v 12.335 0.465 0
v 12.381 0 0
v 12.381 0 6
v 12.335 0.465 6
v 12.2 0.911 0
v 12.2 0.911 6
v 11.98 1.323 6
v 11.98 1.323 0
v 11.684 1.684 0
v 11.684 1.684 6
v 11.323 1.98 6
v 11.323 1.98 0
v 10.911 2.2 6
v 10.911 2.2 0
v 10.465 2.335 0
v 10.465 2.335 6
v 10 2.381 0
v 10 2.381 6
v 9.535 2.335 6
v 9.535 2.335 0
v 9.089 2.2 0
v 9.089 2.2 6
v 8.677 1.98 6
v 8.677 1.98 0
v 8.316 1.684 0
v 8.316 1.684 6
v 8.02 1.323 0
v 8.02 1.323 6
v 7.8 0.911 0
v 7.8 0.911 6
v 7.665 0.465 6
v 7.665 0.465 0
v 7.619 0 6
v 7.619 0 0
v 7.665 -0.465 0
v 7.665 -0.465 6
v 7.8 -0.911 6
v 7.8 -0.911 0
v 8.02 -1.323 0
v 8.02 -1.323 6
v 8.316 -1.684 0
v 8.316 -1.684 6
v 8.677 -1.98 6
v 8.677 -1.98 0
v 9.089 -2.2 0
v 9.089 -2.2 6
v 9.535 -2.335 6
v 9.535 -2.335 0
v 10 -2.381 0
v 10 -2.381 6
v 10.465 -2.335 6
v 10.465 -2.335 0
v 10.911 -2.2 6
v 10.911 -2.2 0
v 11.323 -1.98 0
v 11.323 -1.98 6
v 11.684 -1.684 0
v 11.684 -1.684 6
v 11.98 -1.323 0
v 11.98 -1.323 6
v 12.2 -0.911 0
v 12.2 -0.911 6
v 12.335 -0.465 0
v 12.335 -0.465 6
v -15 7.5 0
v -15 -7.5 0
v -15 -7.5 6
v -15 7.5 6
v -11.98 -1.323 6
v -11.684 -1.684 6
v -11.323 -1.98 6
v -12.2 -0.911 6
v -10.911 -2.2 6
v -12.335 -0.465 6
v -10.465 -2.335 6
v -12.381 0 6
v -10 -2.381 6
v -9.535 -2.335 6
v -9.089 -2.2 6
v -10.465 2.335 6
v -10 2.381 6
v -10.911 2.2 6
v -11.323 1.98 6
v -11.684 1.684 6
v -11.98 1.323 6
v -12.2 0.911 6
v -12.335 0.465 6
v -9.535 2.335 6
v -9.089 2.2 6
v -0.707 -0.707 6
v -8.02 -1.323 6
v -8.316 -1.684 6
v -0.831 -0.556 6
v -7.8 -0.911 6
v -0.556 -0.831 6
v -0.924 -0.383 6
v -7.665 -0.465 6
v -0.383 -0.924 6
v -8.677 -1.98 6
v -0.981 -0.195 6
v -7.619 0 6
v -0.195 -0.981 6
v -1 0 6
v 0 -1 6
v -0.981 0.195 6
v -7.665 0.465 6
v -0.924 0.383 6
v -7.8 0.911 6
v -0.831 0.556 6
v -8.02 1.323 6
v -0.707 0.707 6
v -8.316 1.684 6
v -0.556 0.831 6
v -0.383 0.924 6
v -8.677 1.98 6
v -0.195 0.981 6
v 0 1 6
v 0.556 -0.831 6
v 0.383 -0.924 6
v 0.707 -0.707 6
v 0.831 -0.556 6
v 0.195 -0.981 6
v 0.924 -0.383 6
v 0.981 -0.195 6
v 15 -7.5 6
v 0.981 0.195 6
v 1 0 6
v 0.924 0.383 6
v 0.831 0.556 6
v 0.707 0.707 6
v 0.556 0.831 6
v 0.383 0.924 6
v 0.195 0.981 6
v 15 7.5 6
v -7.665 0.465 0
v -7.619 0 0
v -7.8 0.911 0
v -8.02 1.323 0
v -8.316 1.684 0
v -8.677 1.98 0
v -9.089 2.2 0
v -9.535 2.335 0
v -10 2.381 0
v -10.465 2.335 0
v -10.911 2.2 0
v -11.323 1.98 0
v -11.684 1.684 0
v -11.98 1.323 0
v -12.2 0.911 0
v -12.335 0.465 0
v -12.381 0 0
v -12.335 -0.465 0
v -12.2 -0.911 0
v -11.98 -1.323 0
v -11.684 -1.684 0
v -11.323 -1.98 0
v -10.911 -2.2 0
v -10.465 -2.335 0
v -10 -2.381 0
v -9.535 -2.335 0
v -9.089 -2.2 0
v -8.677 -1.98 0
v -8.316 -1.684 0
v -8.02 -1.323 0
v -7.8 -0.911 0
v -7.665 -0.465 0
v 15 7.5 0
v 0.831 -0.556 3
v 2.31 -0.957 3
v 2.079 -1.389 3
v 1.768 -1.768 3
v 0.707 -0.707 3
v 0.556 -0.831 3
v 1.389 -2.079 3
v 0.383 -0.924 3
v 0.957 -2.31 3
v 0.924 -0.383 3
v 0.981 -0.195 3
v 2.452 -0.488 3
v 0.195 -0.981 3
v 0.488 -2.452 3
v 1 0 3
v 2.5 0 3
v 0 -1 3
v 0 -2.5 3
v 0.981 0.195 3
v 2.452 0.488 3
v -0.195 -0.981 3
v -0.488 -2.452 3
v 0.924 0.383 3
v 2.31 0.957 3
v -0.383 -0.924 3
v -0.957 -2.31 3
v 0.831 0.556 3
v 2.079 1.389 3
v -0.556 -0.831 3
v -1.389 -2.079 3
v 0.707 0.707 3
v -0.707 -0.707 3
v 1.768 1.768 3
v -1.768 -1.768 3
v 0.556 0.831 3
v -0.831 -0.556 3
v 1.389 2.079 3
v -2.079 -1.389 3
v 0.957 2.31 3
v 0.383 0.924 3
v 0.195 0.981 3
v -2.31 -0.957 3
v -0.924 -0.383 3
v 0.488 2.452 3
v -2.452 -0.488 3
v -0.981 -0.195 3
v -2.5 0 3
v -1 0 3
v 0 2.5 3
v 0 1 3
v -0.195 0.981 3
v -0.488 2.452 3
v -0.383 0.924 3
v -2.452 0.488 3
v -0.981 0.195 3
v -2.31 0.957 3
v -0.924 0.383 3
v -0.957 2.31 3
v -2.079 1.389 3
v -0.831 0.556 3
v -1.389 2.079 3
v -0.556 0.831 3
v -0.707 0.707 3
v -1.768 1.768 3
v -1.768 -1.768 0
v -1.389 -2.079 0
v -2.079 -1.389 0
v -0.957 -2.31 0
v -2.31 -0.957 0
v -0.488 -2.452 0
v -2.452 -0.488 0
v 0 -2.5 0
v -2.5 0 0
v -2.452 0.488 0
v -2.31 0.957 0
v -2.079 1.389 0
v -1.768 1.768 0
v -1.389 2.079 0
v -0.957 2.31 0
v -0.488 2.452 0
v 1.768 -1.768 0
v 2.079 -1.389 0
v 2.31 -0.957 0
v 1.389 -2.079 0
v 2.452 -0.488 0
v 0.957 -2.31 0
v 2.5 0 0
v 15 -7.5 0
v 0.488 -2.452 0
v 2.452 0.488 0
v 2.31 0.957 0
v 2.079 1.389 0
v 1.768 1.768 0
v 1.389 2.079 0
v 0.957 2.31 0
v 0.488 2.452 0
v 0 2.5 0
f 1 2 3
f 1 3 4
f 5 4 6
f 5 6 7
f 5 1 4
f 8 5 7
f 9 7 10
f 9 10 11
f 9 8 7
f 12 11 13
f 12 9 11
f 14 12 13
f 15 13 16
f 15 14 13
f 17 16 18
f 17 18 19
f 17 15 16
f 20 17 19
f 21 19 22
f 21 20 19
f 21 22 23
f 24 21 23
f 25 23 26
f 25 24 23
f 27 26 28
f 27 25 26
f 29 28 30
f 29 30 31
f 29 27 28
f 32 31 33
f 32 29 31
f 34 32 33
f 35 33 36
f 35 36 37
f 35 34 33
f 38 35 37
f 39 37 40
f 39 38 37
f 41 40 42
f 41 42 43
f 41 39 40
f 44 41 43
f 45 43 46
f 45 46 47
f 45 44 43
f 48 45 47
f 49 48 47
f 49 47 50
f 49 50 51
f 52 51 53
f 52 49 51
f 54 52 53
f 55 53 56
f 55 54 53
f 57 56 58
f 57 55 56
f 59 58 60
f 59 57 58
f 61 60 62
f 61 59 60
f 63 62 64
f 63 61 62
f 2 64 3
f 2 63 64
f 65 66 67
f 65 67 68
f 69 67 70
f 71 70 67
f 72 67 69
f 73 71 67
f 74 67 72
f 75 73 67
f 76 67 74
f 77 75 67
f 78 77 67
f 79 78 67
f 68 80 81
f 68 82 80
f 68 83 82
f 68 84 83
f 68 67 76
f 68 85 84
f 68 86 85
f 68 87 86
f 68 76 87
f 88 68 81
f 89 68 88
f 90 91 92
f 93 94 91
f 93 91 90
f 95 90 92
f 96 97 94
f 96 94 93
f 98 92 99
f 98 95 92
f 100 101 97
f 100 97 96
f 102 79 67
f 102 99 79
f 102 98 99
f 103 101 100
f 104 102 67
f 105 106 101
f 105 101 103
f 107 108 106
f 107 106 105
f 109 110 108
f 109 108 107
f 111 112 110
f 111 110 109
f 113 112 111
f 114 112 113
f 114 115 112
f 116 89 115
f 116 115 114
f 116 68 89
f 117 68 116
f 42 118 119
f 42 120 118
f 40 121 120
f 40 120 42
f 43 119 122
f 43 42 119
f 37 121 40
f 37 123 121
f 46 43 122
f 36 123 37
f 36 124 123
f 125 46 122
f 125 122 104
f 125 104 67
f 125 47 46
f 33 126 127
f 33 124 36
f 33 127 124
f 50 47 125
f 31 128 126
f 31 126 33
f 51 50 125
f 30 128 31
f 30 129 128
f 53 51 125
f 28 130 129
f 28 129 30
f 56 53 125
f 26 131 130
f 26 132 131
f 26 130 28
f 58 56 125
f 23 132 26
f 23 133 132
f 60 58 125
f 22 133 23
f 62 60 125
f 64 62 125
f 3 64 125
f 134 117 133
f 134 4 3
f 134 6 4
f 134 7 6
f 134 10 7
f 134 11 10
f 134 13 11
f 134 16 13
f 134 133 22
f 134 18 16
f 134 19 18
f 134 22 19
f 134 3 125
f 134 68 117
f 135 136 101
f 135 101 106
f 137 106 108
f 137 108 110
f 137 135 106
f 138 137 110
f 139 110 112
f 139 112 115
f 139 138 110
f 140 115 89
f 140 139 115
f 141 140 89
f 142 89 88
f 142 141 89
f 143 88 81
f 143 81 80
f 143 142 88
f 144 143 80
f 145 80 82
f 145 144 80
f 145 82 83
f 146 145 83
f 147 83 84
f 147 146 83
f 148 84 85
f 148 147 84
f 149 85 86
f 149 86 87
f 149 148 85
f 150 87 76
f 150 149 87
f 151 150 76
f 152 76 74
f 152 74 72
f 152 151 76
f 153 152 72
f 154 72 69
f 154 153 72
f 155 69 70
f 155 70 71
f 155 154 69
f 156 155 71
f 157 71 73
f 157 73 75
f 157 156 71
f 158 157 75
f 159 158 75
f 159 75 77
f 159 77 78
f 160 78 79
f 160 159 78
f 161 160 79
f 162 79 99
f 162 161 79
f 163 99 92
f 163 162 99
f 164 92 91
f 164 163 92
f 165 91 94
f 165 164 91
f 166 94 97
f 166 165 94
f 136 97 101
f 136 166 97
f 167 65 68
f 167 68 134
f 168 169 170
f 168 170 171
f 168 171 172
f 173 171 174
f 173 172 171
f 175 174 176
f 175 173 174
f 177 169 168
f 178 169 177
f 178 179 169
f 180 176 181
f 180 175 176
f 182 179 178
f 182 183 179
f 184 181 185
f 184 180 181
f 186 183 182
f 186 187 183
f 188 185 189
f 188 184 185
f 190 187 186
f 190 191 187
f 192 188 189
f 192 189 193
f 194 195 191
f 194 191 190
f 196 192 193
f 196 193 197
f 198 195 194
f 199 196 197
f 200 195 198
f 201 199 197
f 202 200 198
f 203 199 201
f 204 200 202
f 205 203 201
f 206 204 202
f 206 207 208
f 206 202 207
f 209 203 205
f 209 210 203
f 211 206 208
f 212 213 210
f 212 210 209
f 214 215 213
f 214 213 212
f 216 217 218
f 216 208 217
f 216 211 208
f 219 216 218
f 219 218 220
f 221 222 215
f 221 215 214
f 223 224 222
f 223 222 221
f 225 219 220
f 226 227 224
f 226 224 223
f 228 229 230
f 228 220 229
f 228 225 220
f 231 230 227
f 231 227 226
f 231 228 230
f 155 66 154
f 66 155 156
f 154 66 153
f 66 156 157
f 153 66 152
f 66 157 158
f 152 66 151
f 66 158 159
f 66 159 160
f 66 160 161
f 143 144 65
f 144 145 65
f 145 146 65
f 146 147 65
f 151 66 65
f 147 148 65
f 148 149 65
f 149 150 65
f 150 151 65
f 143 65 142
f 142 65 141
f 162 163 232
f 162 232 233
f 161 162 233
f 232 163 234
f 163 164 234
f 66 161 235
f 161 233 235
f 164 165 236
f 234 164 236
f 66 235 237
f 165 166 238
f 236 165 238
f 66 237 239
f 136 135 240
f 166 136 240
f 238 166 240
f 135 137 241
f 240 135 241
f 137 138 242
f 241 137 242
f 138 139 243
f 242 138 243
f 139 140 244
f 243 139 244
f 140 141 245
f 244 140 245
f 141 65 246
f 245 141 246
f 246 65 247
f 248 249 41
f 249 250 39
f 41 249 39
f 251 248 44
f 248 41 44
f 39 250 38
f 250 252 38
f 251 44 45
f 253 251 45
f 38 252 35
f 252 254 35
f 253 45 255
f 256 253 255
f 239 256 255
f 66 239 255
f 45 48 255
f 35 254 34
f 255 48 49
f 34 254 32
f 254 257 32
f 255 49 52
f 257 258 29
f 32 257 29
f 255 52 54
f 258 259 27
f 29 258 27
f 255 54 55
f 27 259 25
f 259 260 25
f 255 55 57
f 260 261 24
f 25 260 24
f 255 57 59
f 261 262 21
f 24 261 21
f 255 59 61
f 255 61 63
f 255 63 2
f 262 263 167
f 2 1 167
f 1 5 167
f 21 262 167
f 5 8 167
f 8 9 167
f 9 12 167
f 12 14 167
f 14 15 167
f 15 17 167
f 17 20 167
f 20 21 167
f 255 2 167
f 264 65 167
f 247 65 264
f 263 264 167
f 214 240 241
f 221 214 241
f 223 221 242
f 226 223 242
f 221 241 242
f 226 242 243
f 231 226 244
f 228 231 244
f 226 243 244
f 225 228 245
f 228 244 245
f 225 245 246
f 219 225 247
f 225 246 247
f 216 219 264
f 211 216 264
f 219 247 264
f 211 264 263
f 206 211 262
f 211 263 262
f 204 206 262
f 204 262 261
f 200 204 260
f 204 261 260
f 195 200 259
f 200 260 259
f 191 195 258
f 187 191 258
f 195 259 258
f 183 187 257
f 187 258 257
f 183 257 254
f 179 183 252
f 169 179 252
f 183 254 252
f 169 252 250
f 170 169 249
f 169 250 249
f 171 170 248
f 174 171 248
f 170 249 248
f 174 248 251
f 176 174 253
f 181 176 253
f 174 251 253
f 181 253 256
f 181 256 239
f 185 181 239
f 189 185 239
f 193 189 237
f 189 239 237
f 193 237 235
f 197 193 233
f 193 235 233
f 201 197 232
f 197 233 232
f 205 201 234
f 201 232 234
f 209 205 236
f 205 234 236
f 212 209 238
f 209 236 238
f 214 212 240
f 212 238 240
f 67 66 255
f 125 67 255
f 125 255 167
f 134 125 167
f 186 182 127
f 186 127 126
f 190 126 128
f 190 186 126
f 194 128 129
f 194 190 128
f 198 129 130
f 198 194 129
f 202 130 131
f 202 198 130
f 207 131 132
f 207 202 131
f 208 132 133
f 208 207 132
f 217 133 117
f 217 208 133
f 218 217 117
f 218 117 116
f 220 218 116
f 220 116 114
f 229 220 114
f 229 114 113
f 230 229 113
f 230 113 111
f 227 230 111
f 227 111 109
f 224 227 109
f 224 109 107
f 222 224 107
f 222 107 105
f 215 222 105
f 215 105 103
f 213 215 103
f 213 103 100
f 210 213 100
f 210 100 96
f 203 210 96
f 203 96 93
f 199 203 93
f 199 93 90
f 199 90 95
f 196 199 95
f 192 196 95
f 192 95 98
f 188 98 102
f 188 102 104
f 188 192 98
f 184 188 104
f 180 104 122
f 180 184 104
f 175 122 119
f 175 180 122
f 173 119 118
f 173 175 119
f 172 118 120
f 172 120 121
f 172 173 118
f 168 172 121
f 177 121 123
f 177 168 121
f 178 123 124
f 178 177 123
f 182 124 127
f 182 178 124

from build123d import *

# Parameters (mm, degrees)
SKETCH1_W           = 30
SKETCH1_H           = 15
SKETCH1_R           = 1
SKETCH1_R_2         = 2.38125
BOSS_EXTRUDE1_DEPTH = 6
SKETCH3_R           = 2.5
CUT_EXTRUDE2_DEPTH  = 3


with BuildPart() as part:
    # Sketch1 → Boss-Extrude1 (new body)
    with BuildSketch(Plane.XY):
        Rectangle(SKETCH1_W, SKETCH1_H)
        Circle(SKETCH1_R, mode=Mode.SUBTRACT)
        with Locations((10, 0)):
            Circle(SKETCH1_R_2, mode=Mode.SUBTRACT)
        with Locations((-10, 0)):
            Circle(SKETCH1_R_2, mode=Mode.SUBTRACT)
    extrude(amount=BOSS_EXTRUDE1_DEPTH)

    # Sketch3 → Cut-Extrude2 (cut)
    with BuildSketch(Plane(origin=(0, 0, 0), x_dir=(-1, 0, 0), z_dir=(0, 0, -1))):
        Circle(SKETCH3_R)
    extrude(amount=-CUT_EXTRUDE2_DEPTH, mode=Mode.SUBTRACT)


solid = part.part
